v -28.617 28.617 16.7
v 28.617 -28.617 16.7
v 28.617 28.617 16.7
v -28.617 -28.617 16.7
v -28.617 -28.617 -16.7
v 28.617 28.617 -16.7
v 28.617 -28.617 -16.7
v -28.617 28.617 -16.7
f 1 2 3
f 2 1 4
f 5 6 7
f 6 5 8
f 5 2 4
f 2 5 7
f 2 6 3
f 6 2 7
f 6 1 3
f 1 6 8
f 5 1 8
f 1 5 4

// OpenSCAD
/*
\\   //
 \\-//
 |   |
 //-\\
//   \\
*/

slat_width = 25.4;
slat_thick = 6;

wall_thickness = 4;
leg_length = 25.4;

clip_width = 10;

angle = 90;

//calculated
leg_thickness = slat_width + 2 * wall_thickness;
leg_height = slat_thick + wall_thickness;

center_width = clip_width + 2 * leg_thickness * cos(angle / 2);

//Center box
cube([center_width, center_width, leg_thickness], true);
